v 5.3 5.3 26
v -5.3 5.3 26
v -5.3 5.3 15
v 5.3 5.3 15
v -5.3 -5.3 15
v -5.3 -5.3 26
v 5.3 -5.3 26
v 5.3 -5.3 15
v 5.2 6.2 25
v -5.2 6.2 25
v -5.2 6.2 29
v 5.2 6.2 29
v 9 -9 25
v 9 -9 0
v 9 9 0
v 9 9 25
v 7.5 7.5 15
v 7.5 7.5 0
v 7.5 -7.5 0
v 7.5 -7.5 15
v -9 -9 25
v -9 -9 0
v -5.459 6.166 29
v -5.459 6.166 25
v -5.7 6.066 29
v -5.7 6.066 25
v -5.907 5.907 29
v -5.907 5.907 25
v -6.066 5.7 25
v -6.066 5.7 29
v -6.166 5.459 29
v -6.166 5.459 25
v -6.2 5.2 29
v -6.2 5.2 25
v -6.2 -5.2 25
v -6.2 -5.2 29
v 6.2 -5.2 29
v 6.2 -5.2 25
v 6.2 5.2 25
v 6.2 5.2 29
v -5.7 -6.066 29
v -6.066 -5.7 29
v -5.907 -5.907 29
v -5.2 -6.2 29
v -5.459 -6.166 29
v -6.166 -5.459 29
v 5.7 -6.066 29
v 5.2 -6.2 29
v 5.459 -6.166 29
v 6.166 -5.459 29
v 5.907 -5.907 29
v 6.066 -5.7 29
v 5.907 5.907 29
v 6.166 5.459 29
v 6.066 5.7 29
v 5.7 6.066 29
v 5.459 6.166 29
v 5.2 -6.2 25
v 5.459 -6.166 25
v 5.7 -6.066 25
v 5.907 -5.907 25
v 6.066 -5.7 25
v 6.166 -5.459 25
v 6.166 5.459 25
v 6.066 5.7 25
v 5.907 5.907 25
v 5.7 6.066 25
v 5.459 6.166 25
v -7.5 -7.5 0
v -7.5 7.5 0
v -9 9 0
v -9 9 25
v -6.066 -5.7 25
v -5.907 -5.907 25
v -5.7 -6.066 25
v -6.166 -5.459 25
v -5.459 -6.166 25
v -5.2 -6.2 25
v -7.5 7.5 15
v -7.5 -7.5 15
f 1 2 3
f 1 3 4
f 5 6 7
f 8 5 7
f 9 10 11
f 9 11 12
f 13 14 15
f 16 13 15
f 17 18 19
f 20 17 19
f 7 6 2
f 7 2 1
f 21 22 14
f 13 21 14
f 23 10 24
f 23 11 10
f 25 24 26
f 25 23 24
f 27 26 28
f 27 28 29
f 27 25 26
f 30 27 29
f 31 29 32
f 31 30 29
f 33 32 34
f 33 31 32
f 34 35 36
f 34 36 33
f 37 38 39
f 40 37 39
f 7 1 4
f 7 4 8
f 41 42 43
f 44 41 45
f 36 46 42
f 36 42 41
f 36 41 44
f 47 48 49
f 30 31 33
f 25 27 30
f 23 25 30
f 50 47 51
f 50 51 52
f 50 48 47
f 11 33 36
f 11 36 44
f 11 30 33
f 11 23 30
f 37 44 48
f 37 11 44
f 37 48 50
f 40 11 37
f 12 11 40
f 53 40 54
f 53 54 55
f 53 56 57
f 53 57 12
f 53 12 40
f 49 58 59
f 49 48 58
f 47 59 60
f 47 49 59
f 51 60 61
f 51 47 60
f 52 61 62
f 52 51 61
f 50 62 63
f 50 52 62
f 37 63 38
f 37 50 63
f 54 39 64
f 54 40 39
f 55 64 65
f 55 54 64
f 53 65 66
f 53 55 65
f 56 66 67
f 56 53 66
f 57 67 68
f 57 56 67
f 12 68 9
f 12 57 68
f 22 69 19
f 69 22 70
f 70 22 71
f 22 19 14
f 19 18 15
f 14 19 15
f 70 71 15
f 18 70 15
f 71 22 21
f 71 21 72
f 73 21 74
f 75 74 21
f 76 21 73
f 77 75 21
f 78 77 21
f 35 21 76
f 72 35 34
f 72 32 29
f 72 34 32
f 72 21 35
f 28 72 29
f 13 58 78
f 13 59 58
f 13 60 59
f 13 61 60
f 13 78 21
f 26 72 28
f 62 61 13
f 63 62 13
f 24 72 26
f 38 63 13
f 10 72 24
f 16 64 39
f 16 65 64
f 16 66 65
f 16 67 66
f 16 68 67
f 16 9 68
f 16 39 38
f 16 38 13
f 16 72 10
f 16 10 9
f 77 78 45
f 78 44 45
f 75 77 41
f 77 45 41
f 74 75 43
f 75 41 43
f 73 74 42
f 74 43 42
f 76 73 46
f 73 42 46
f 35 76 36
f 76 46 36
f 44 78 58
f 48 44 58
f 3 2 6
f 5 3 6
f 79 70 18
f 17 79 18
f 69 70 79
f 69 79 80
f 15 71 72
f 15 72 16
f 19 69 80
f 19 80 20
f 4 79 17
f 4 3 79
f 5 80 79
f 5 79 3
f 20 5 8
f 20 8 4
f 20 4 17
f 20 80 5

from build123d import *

# Parameters (mm, degrees)
F0_W     = 18
F0_H     = 18
F1_DEPTH = 25
F2_W     = 12.4
F2_H     = 12.4
F3_DEPTH = 4
F4_W     = 15
F4_H     = 15
F5_DEPTH = 15
F6_W     = 10.6
F6_H     = 10.6
F7_DEPTH = 11
F8_R     = 1


with BuildPart() as f1:
    # F0 (on Top) → F1 (new body)
    with BuildSketch(Plane.XY):
        Rectangle(F0_W, F0_H)
    extrude(amount=F1_DEPTH)

    # F2 (on face) → F3 (join)
    with BuildSketch(Plane.XY.offset(25)):
        Rectangle(F2_W, F2_H)
    extrude(amount=F3_DEPTH)

    # F4 (on face) → F5 (cut)
    with BuildSketch(Plane(origin=(0, 0, 0), x_dir=(1, 0, 0), z_dir=(0, 0, -1))):
        Rectangle(F4_W, F4_H)
    extrude(amount=-F5_DEPTH, mode=Mode.SUBTRACT)

    # F6 (on face) → F7 (cut)
    with BuildSketch(Plane(origin=(0, 0, 15), x_dir=(1, 0, 0), z_dir=(0, 0, -1))):
        Rectangle(F6_W, F6_H)
    extrude(amount=-F7_DEPTH, mode=Mode.SUBTRACT)

    # F8
    f8_edges = [f1.edges().sort_by_distance(p)[0] for p in [
        (6.2, -6.2, 27),
        (6.2, 6.2, 27),
        (-6.2, 6.2, 27),
        (-6.2, -6.2, 27),
    ]]
    fillet(f8_edges, radius=F8_R)


solid = f1.part
